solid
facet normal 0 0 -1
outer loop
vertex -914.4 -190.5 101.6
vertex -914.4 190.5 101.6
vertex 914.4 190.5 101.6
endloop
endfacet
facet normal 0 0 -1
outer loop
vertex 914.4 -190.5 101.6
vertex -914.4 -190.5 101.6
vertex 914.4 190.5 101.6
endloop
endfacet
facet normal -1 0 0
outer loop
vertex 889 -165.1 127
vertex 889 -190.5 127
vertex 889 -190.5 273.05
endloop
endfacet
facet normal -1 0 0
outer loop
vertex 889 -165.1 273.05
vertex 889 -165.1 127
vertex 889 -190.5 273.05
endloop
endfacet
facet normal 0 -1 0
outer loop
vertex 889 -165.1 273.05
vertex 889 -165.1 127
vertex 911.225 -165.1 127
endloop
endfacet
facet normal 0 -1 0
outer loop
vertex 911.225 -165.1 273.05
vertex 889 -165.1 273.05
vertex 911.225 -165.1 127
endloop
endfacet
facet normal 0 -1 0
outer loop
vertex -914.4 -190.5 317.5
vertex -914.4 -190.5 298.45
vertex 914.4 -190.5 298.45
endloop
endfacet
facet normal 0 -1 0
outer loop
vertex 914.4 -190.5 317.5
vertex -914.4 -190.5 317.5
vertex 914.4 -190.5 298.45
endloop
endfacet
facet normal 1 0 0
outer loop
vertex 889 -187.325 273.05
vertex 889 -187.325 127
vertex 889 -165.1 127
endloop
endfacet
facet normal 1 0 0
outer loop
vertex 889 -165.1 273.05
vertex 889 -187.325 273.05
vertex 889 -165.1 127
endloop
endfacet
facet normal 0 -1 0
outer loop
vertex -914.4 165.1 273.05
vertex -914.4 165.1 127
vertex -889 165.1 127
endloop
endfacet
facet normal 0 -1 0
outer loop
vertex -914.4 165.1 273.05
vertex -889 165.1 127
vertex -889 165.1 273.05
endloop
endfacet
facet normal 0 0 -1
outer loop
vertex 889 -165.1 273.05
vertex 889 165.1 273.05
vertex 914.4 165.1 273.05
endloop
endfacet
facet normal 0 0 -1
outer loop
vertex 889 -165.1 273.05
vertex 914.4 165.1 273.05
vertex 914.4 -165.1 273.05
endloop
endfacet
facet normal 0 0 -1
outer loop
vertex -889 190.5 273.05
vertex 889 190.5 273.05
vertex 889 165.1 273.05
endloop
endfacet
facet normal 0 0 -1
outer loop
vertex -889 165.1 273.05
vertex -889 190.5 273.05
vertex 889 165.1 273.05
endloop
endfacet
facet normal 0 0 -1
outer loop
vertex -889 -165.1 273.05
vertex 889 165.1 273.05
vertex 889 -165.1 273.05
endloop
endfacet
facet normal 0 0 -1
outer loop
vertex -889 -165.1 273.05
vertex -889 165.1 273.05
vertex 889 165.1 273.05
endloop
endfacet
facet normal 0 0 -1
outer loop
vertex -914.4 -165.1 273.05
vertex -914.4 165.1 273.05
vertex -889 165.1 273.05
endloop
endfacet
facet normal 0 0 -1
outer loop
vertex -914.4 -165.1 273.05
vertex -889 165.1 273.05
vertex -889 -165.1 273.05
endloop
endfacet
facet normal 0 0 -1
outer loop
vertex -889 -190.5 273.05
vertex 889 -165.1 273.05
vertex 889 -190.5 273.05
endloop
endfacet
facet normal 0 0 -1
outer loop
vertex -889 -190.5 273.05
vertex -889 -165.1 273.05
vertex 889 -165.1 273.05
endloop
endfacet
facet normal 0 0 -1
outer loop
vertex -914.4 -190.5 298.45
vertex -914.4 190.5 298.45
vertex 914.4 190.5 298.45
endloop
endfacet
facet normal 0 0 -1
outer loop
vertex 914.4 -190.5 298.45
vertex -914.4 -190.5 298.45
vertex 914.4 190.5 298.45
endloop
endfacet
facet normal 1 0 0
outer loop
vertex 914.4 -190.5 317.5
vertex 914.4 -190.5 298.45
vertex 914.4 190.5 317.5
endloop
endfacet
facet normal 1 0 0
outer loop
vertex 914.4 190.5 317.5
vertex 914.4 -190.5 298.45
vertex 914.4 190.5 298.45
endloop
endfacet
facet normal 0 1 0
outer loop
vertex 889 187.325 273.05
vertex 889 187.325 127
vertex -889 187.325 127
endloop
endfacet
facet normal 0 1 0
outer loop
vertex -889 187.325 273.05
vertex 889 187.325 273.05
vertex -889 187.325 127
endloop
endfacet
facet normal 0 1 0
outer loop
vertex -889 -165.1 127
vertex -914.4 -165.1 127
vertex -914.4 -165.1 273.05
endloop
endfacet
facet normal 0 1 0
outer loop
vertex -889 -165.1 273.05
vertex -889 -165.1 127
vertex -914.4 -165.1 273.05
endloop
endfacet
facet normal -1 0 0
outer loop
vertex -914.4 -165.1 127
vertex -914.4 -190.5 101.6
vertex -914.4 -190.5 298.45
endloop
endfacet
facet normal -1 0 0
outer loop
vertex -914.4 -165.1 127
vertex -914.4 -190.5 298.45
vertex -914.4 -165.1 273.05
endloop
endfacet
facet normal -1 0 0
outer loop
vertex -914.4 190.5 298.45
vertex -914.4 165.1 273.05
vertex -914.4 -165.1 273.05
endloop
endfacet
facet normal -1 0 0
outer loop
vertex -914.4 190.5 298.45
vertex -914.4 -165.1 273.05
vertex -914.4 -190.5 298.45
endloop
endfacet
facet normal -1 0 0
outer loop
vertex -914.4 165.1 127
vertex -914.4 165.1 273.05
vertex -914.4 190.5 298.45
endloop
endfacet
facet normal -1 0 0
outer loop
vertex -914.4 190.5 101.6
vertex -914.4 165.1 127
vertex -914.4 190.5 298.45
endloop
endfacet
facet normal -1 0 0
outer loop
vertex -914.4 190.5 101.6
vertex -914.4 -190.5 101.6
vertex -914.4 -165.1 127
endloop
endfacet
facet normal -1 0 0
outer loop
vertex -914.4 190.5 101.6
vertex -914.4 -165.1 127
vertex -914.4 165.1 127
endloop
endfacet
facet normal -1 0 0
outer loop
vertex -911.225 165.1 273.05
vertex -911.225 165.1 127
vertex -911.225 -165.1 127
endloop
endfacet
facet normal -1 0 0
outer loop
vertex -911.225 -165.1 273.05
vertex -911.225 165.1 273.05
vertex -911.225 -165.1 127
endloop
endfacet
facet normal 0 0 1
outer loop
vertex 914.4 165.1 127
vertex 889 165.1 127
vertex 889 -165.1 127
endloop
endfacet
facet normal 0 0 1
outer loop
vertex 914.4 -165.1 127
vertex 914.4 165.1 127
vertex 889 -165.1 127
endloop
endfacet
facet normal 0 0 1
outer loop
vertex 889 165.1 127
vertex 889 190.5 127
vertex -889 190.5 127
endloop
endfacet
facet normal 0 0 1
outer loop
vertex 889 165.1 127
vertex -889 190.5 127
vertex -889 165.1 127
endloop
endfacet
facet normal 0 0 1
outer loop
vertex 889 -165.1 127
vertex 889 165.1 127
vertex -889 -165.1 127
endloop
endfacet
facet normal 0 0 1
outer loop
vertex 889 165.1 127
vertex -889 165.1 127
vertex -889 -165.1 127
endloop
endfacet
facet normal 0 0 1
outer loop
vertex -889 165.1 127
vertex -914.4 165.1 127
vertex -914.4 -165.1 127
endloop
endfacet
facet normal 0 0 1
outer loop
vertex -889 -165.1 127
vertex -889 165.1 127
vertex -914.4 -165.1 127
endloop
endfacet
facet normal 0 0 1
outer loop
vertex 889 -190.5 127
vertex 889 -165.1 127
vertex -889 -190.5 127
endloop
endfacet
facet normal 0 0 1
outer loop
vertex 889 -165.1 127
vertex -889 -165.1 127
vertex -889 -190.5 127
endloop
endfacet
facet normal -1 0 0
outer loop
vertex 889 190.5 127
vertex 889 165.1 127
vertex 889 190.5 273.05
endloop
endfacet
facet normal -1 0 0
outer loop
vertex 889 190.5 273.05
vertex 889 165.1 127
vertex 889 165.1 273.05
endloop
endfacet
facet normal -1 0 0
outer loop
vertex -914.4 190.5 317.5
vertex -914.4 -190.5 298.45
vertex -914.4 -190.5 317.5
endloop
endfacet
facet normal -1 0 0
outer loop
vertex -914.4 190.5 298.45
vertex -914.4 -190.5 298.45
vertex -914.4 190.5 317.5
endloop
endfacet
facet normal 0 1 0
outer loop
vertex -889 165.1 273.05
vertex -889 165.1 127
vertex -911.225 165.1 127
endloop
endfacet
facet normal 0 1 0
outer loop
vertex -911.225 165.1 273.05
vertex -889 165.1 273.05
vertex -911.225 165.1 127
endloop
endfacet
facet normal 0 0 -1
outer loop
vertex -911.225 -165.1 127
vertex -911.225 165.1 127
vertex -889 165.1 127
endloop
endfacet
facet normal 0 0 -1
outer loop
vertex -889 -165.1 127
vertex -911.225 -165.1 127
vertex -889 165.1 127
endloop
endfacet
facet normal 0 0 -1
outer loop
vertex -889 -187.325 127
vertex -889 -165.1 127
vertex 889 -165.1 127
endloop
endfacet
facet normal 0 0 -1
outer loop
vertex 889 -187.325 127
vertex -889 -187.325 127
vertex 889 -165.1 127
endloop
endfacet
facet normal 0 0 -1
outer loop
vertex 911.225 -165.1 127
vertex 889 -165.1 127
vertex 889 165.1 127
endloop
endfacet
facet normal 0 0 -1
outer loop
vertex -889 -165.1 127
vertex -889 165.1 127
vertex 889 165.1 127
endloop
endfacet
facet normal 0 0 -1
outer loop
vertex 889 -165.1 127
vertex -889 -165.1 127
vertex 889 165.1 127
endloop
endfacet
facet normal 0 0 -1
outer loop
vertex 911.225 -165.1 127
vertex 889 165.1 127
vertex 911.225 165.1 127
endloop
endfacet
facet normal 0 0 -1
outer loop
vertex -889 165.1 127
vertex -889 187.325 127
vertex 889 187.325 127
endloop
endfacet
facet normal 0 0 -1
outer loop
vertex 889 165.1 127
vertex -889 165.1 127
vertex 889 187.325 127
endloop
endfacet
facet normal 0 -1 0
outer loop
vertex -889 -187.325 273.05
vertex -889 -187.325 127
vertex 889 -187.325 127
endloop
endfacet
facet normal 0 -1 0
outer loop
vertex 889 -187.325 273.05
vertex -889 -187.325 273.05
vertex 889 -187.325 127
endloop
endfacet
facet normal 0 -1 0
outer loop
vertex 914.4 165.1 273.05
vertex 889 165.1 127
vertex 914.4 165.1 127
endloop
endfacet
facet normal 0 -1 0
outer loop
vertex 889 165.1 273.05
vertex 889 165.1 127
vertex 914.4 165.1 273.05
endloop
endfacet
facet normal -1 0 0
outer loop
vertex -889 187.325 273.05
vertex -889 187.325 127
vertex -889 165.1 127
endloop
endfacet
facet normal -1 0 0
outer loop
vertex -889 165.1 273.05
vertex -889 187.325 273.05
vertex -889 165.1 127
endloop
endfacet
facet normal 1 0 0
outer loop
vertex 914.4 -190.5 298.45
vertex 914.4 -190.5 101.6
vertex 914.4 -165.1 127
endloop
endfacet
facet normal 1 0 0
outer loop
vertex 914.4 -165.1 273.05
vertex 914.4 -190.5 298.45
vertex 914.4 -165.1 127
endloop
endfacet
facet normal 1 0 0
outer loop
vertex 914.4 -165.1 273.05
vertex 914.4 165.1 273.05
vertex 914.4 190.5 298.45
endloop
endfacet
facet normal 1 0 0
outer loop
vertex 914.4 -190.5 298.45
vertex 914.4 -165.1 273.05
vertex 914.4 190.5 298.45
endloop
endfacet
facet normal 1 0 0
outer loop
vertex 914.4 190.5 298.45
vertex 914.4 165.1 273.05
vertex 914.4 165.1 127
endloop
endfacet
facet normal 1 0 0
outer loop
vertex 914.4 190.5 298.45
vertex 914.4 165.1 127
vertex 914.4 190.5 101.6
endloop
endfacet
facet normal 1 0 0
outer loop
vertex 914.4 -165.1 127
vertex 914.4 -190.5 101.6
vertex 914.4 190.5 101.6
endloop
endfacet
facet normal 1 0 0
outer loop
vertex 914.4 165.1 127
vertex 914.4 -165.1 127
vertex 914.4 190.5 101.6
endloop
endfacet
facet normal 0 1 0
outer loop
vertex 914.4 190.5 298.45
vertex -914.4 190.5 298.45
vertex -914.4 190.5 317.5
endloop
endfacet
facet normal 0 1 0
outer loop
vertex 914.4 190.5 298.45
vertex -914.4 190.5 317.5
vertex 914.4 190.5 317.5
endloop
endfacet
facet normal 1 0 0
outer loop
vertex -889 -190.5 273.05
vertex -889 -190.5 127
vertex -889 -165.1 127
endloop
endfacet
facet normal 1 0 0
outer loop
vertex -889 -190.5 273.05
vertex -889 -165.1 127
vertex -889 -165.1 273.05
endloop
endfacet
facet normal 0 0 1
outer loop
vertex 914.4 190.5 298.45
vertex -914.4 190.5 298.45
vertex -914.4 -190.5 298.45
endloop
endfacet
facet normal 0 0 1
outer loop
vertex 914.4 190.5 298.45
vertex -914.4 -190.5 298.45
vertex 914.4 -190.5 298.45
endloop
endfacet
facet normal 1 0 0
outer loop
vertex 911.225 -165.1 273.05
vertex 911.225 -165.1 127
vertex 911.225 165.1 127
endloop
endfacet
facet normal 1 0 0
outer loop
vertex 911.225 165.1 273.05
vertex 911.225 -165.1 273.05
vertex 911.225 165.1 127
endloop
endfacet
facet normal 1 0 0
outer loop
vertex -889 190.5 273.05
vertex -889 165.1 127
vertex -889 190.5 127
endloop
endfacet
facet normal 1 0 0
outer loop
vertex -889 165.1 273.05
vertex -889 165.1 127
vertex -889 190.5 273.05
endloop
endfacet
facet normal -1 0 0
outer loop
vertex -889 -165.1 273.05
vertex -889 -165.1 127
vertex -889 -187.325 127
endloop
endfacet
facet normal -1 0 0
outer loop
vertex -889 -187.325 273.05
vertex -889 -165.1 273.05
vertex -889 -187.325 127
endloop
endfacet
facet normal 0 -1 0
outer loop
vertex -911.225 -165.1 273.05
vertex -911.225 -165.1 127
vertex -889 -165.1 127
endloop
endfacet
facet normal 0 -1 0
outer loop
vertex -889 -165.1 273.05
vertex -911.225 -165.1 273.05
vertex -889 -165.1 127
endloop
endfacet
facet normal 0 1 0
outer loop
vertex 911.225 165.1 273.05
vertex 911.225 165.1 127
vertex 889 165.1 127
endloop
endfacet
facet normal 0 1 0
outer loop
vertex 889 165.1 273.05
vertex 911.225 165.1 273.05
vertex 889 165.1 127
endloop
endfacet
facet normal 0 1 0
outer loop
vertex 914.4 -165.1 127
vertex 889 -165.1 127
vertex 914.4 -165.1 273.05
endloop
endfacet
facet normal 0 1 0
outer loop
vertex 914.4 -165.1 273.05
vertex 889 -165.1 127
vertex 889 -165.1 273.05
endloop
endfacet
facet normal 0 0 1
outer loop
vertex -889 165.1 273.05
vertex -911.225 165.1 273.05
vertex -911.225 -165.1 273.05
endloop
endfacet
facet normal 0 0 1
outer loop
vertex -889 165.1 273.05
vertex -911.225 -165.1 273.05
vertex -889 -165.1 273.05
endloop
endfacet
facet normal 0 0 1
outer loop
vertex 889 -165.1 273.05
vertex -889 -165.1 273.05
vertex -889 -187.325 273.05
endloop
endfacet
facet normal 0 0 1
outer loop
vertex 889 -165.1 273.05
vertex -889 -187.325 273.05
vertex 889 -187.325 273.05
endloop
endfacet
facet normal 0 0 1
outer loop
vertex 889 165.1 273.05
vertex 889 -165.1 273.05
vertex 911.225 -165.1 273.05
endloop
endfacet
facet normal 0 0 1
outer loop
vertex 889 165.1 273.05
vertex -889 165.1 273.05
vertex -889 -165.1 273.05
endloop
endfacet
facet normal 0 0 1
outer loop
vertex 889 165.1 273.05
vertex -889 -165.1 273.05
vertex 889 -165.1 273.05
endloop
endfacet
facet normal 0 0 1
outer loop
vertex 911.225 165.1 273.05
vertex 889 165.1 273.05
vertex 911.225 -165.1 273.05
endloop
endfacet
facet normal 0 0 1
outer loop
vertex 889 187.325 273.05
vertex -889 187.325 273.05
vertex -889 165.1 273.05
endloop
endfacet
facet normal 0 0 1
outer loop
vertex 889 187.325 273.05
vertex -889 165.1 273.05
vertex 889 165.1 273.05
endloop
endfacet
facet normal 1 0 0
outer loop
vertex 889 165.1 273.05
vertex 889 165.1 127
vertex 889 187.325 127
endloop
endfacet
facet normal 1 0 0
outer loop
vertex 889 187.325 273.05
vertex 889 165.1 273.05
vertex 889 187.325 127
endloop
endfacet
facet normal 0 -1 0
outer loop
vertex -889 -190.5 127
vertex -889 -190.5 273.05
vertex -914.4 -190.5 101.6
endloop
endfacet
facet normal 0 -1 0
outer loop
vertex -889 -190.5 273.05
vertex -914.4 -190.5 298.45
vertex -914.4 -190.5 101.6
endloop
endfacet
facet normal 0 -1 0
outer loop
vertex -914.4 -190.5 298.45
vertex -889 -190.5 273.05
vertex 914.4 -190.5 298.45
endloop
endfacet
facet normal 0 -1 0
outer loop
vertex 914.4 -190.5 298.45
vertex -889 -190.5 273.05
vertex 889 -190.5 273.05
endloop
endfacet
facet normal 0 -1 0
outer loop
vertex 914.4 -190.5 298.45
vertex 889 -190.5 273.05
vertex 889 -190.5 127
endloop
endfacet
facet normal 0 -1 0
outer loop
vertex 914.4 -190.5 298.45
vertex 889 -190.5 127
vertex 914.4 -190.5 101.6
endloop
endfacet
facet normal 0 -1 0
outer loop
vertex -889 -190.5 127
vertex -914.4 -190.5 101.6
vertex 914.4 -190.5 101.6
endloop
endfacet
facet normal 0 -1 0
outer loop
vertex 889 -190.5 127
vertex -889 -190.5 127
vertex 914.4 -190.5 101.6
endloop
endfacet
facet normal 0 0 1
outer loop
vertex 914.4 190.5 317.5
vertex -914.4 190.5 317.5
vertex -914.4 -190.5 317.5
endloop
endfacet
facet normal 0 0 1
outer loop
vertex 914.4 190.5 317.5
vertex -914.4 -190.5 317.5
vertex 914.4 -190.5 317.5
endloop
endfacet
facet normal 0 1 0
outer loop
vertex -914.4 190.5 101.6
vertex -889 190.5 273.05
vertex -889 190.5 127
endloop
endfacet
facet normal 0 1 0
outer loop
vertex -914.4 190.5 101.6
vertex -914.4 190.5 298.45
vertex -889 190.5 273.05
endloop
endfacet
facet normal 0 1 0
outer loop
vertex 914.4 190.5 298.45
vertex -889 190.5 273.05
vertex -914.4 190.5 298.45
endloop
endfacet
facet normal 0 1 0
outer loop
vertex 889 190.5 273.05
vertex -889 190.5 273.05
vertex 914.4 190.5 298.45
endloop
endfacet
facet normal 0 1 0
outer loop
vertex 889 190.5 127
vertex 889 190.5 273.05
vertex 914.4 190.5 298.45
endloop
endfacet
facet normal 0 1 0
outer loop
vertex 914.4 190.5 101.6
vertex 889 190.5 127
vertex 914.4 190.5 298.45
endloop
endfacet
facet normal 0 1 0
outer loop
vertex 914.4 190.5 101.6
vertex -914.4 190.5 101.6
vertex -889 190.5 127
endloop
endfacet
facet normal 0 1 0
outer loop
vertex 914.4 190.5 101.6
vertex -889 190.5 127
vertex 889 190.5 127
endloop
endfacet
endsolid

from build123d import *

# Parameters (mm, degrees)
F0_W      = 1828.8
F0_H      = 381
F1_DEPTH  = 298.45
F2_DEPTH  = 101.6
F3_W      = 1828.8
F3_H      = 381
F4_DEPTH  = 19.05
F5_W      = 330.2
F5_H      = 146.05
F6_DEPTH  = 1828.801
F7_W      = 1778
F7_H      = 146.05
F8_DEPTH  = 381.001
F10_DEPTH = 146.05


with BuildPart() as f1:
    # F0 (on Top) → F1 (new body)
    with BuildSketch(Plane.XY):
        Rectangle(F0_W, F0_H)
    extrude(amount=F1_DEPTH)

    # F0 (on Top) → F2 (cut)
    with BuildSketch(Plane.XY):
        Rectangle(F0_W, F0_H)
    extrude(amount=F2_DEPTH, mode=Mode.SUBTRACT)

    # F5 (on face) → F6 (cut, through all)
    with BuildSketch(Plane(origin=(-914.4, 0, 0), x_dir=(0, -1, 0), z_dir=(-1, 0, 0))):
        with Locations((0, 200.025)):
            Rectangle(F5_W, F5_H)
    extrude(amount=-F6_DEPTH, mode=Mode.SUBTRACT)

    # F7 (on face) → F8 (cut, through all)
    with BuildSketch(Plane.XZ.offset(190.5)):
        with Locations((0, 200.025)):
            Rectangle(F7_W, F7_H)
    extrude(amount=-F8_DEPTH, mode=Mode.SUBTRACT)


with BuildPart() as f4:
    # F3 (on face) → F4 (new body)
    with BuildSketch(Plane.XY.offset(298.45)):
        Rectangle(F3_W, F3_H)
    extrude(amount=F4_DEPTH)


with BuildPart() as f10:
    # F9 (on face) → F10 (new body, through all)
    with BuildSketch(Plane.XY.offset(127)):
        Polygon((-889, 187.325), (-889, 165.1), (-911.225, 165.1), (-911.225, -165.1), (-889, -165.1), (-889, -187.325), (889, -187.325), (889, -165.1), (911.225, -165.1), (911.225, 165.1), (889, 165.1), (889, 187.325), align=None)
    extrude(amount=F10_DEPTH)


solid = Compound([f1.part, f4.part, f10.part])
